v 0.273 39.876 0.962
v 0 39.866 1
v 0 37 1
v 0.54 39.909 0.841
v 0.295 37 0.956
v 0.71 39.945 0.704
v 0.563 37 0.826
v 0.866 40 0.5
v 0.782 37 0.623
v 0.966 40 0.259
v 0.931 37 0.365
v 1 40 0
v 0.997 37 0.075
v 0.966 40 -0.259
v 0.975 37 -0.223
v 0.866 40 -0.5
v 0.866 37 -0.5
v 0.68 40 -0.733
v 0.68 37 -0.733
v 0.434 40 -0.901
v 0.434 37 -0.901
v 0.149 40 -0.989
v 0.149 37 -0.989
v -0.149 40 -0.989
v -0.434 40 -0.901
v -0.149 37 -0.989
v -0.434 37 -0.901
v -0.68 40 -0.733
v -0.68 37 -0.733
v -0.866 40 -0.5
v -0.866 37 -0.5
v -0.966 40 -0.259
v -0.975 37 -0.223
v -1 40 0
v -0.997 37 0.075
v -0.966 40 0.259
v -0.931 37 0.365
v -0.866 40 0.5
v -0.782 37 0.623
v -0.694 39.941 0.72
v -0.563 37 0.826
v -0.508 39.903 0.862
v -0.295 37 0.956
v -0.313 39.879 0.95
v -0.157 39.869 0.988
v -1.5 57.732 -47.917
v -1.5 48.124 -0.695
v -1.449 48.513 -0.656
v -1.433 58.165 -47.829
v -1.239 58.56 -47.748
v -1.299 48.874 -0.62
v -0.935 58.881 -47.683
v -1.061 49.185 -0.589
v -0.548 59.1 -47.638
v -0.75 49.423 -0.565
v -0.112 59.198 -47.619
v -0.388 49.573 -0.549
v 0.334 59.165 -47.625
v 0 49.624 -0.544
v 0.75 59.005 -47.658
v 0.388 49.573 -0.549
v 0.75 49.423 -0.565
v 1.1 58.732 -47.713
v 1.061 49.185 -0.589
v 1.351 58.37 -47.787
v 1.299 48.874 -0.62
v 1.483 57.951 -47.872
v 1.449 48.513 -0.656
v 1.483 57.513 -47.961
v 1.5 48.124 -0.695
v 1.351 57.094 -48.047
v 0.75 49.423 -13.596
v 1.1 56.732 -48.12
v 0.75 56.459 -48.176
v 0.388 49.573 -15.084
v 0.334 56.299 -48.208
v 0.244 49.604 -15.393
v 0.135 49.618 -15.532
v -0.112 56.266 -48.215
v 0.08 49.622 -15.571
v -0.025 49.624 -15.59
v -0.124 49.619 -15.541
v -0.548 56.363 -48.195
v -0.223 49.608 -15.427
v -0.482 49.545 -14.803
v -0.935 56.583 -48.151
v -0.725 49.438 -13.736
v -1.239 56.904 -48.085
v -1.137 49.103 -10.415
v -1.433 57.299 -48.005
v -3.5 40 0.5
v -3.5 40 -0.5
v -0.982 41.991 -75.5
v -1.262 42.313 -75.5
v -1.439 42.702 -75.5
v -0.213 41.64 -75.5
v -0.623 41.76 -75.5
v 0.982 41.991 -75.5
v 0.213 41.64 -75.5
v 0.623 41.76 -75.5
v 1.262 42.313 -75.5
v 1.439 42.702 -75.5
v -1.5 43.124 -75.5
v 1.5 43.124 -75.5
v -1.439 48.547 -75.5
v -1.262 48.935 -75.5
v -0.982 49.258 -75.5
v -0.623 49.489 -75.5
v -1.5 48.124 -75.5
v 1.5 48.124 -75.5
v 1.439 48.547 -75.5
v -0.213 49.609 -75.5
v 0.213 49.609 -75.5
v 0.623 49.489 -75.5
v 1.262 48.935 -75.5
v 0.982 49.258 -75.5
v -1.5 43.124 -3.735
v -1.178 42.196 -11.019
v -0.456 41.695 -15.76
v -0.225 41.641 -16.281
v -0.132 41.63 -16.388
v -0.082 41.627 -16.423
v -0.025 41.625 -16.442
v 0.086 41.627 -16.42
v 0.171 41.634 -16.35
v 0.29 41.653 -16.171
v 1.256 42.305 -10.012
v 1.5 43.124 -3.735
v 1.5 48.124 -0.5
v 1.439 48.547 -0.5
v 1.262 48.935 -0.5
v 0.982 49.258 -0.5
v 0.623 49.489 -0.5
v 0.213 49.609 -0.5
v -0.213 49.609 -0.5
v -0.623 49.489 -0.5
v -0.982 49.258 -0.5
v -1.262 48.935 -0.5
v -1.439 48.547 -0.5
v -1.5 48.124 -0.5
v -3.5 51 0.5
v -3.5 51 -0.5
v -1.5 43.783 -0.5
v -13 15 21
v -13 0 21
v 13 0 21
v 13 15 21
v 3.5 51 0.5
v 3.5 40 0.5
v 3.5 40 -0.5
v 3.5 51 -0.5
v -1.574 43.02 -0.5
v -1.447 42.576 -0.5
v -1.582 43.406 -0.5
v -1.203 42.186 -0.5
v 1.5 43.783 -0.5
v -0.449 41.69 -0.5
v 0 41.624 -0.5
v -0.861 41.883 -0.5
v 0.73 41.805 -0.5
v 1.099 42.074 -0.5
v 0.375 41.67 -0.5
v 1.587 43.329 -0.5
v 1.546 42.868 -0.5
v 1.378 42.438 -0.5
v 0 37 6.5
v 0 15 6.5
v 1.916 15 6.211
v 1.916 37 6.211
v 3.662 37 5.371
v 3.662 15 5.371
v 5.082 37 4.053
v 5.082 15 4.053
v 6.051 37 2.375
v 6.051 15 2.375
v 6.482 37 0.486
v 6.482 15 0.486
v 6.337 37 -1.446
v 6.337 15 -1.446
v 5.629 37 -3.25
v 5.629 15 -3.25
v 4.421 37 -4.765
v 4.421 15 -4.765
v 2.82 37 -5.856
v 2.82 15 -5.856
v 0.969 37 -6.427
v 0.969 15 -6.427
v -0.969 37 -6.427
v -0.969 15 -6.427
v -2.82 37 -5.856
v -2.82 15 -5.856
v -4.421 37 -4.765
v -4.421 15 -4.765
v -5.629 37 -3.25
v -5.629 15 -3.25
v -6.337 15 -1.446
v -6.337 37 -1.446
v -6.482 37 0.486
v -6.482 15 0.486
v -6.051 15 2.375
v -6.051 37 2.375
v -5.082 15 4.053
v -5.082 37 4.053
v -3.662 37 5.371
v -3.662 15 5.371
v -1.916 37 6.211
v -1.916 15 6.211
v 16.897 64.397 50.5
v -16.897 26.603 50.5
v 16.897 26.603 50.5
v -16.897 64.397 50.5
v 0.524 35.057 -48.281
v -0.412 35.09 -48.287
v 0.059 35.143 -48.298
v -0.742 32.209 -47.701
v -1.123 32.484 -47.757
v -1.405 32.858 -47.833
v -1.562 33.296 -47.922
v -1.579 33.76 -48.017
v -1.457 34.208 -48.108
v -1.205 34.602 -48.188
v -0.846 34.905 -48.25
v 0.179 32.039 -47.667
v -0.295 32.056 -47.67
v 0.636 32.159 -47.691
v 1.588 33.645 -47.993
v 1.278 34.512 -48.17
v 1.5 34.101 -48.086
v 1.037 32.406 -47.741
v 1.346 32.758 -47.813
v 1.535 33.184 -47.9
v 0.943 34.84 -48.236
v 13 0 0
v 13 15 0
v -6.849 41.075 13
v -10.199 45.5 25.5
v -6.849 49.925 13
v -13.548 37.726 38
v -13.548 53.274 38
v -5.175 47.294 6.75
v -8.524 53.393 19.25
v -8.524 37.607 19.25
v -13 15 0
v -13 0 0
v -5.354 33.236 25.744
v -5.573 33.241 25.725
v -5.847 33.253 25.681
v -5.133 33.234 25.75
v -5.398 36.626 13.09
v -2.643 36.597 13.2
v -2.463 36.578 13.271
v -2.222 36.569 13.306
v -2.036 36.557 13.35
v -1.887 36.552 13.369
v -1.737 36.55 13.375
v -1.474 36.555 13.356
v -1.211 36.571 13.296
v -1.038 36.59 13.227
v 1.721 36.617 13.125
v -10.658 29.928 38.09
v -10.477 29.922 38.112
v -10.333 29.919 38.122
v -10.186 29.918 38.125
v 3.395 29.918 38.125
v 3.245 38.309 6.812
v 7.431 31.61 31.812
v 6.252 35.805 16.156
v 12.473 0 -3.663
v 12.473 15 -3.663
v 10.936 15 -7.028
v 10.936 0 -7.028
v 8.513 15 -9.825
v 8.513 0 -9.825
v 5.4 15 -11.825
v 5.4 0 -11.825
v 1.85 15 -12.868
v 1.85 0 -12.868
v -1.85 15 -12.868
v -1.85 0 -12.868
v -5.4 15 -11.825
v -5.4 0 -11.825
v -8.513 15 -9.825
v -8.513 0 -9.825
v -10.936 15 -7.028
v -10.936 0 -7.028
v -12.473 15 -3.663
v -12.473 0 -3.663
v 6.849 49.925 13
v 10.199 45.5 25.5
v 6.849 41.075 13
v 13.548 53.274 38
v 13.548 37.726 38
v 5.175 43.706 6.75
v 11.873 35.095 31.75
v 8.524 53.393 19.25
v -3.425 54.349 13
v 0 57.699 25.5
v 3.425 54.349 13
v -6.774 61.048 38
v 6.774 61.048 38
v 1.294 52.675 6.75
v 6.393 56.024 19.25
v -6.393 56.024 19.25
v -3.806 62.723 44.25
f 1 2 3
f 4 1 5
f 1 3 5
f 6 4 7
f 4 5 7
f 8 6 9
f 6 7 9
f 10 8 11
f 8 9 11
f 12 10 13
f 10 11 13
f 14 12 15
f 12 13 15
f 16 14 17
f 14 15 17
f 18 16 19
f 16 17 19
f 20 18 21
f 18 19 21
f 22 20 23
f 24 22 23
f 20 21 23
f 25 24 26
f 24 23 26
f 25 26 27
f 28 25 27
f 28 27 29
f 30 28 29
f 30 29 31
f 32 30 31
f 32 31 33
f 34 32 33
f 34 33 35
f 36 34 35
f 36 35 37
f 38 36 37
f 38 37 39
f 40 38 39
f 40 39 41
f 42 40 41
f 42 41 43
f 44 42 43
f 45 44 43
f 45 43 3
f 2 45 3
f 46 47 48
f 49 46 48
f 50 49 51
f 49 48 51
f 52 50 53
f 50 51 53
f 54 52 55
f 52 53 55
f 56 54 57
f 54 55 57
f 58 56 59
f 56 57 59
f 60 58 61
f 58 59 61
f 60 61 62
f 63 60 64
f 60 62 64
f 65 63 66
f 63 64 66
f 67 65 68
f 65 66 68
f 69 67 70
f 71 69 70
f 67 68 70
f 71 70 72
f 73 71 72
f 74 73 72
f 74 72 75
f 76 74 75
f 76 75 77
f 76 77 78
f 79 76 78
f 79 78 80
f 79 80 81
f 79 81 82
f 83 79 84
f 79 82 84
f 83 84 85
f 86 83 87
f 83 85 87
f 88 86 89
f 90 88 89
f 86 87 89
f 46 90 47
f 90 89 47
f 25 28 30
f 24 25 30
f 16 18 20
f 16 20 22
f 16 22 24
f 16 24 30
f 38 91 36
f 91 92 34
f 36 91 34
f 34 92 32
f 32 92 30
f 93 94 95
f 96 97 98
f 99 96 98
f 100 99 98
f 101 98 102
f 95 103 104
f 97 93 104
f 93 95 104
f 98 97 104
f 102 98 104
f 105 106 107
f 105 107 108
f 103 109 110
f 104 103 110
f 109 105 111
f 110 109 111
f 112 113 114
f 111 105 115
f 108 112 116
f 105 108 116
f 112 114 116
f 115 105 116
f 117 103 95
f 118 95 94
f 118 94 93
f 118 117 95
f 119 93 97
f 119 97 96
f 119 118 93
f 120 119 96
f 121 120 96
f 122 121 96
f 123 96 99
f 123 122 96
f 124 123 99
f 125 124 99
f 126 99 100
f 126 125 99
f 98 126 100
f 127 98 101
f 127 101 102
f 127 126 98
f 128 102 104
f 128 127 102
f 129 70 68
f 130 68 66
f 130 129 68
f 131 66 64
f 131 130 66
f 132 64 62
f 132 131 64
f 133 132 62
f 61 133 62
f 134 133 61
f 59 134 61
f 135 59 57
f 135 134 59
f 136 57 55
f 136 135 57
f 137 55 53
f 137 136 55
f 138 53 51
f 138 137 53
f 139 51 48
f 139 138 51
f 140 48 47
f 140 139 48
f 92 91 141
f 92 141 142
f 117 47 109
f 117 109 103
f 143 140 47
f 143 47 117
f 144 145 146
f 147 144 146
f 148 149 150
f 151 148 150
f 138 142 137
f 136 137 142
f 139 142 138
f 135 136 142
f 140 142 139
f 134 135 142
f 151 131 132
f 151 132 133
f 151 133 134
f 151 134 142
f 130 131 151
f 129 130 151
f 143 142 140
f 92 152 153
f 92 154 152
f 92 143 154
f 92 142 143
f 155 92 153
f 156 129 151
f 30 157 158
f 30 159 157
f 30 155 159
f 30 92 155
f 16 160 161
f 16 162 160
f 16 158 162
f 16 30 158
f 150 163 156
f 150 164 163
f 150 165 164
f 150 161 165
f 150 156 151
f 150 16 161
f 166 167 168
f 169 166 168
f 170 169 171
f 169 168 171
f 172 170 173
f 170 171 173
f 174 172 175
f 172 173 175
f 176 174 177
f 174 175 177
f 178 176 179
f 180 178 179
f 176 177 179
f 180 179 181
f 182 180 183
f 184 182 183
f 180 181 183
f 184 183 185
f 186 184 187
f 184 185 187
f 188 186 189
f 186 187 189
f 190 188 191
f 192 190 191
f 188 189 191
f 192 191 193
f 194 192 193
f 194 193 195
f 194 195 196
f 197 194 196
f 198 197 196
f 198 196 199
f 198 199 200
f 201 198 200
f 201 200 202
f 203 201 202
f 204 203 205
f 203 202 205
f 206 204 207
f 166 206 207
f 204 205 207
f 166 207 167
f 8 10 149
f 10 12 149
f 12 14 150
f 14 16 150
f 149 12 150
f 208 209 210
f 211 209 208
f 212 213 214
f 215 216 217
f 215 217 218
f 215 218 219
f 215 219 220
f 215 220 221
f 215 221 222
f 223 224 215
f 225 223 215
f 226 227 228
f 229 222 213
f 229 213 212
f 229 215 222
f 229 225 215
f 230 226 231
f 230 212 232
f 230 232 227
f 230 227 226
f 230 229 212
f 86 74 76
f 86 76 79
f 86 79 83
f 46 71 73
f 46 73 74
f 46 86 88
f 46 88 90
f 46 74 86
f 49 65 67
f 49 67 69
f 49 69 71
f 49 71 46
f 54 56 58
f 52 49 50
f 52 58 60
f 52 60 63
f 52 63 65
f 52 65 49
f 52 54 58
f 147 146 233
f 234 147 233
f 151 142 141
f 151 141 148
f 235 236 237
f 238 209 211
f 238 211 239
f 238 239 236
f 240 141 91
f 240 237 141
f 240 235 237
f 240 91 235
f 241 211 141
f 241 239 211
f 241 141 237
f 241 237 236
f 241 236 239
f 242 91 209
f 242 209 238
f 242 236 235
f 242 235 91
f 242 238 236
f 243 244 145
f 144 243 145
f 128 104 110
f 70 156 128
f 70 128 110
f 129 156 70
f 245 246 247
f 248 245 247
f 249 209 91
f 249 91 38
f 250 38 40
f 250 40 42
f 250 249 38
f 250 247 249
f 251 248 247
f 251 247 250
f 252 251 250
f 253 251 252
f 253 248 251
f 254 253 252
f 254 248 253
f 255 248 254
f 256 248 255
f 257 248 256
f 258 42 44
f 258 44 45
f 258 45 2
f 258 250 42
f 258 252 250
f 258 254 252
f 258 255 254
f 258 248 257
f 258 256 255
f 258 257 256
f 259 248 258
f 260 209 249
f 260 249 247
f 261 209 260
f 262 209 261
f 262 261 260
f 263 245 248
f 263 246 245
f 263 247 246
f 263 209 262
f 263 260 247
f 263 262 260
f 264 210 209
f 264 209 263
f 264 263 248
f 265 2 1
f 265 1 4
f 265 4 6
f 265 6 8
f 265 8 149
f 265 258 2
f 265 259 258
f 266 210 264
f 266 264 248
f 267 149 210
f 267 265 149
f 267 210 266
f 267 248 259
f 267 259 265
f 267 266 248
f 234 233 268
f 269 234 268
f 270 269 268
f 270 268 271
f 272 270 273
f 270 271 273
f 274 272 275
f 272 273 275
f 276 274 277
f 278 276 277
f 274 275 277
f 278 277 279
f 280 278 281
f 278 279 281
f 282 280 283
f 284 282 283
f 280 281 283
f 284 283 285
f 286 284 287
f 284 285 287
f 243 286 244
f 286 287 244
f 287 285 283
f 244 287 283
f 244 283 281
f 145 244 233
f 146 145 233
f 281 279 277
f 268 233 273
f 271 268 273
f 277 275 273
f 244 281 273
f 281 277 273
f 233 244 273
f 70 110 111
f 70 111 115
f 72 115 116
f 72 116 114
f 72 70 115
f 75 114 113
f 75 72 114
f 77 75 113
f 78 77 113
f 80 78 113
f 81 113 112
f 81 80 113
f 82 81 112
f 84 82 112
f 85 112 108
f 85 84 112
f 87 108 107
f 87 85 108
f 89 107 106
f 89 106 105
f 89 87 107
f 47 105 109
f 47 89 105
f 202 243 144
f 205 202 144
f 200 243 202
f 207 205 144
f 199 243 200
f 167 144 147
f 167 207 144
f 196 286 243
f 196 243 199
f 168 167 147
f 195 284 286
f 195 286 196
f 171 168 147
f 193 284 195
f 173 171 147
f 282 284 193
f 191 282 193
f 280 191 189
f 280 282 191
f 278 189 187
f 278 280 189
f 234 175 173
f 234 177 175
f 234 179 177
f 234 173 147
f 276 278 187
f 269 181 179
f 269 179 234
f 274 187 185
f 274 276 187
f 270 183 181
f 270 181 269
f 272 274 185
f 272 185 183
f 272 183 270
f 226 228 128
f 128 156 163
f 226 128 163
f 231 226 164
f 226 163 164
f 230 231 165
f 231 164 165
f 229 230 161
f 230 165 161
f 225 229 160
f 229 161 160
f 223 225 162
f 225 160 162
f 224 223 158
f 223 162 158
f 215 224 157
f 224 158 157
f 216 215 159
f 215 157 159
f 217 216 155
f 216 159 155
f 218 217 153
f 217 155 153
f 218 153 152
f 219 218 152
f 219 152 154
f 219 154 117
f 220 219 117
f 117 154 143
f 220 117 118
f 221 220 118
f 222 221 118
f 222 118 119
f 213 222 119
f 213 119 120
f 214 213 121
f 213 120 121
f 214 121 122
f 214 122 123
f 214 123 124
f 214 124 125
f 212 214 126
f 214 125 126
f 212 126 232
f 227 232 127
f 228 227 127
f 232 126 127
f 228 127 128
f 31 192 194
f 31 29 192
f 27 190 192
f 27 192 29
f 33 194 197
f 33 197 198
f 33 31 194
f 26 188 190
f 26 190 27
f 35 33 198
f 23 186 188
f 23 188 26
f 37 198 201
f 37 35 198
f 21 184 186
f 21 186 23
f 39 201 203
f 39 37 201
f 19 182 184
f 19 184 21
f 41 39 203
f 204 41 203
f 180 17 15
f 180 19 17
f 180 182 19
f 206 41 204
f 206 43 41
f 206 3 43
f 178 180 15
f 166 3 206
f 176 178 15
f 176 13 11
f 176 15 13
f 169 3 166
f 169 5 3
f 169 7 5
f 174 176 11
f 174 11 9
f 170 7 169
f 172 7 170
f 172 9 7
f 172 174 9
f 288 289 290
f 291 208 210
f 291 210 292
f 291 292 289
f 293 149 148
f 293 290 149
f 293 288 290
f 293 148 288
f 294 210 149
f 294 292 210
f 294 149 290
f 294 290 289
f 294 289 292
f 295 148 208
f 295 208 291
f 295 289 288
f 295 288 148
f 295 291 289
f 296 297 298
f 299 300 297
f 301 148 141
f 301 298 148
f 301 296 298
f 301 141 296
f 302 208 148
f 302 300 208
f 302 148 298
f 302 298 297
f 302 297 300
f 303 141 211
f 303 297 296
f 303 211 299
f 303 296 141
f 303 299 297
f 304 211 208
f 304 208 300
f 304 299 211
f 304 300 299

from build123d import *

# Parameters (mm, degrees)
BOSS_EXTRUDE1_DEPTH = 15
SKETCH2_R           = 6.5
BOSS_EXTRUDE2_DEPTH = 22
SKETCH3_R           = 1
BOSS_EXTRUDE3_DEPTH = 3
SKETCH4_W           = 7
SKETCH4_H           = 1
BOSS_EXTRUDE4_DEPTH = 11
SKETCH5_R           = 1.5
BOSS_EXTRUDE5_DEPTH = 20
BOSS_EXTRUDE6_DEPTH = 75
SKETCH7_R           = 1.589398049
BOSS_EXTRUDE7_DEPTH = 50
SKETCH8_R           = 1.5
BOSS_EXTRUDE8_DEPTH = 50
SKETCH9_W           = 7
SKETCH9_H           = 11
BOSS_EXTRUDE9_DEPTH = 50
BOSS_EXTRUDE9_TAPER = -15


with BuildPart() as part:
    # Sketch1 → Boss-Extrude1 (new body)
    with BuildSketch(Plane(origin=(0, 0, 0), x_dir=(1, 0, 0), z_dir=(0, 1, 0))):
        with BuildLine():
            Line((-13, 0), (-13, -21))
            Line((-13, -21), (13, -21))
            Line((13, -21), (13, 0))
            ThreePointArc((13, 0), (0, 13), (-13, 0))
        make_face()
    extrude(amount=BOSS_EXTRUDE1_DEPTH)

    # Sketch2 → Boss-Extrude2 (add)
    with BuildSketch(Plane(origin=(0, 15, 0), x_dir=(1, 0, 0), z_dir=(0, 1, 0))):
        Circle(SKETCH2_R)
    extrude(amount=BOSS_EXTRUDE2_DEPTH)

    # Sketch3 → Boss-Extrude3 (add)
    with BuildSketch(Plane(origin=(0, 37, 0), x_dir=(1, 0, 0), z_dir=(0, 1, 0))):
        Circle(SKETCH3_R)
    extrude(amount=BOSS_EXTRUDE3_DEPTH)

    # Sketch4 → Boss-Extrude4 (add)
    with BuildSketch(Plane(origin=(0, 40, 0), x_dir=(1, 0, 0), z_dir=(0, 1, 0))):
        Rectangle(SKETCH4_W, SKETCH4_H)
    extrude(amount=BOSS_EXTRUDE4_DEPTH)

    # Sketch5 → Boss-Extrude5 (add)
    with BuildSketch(Plane.XY.offset(0.5)):
        with Locations((0, 45.870127471)):
            Circle(SKETCH5_R)
    extrude(amount=BOSS_EXTRUDE5_DEPTH)

    # Sketch6 → Boss-Extrude6 (add)
    with BuildSketch(Plane(origin=(0, 0, -0.5), x_dir=(-1, 0, 0), z_dir=(0, 0, -1))):
        with BuildLine():
            Line((1.5, 48.124460967), (1.5, 43.124460967))
            ThreePointArc((1.5, 43.124460967), (0, 41.624460967), (-1.5, 43.124460967))
            Line((-1.5, 43.124460967), (-1.5, 48.124460967))
            ThreePointArc((-1.5, 48.124460967), (0, 49.624460967), (1.5, 48.124460967))
        make_face()
    extrude(amount=BOSS_EXTRUDE6_DEPTH)


with BuildPart() as boss_extrude7_tool:
    # Sketch7 → Boss-Extrude7 (new body)
    with BuildSketch(Plane(origin=(0, 1.929443455, 9.483517563), x_dir=(-1, 0, 0), z_dir=(0, -0.1993679344171976, -0.9799247046208295))):
        with Locations((0, 42.477919634)):
            Circle(SKETCH7_R)
    extrude(amount=BOSS_EXTRUDE7_DEPTH)


with BuildPart() as part_1:
    add(part.part)


with BuildPart() as part_2:
    # Boss-Extrude7: joined with boss_extrude7_tool
    add(part_1.part.fuse(boss_extrude7_tool.part, tol=0.00001))

    # Sketch8 → Boss-Extrude8 (add)
    with BuildSketch(Plane(origin=(0, 1.687585713, -8.294748783), x_dir=(-1, 0, 0), z_dir=(0, 0.1993679344171843, -0.9799247046208323))):
        with Locations((0, 47.019713669)):
            Circle(SKETCH8_R)
    extrude(amount=BOSS_EXTRUDE8_DEPTH)

    # Sketch9 → Boss-Extrude9 (add)
    with BuildSketch(Plane.XY.offset(0.5)):
        with Locations((0, 45.5)):
            Rectangle(SKETCH9_W, SKETCH9_H)
    extrude(amount=BOSS_EXTRUDE9_DEPTH, taper=BOSS_EXTRUDE9_TAPER)


solid = part_2.part
